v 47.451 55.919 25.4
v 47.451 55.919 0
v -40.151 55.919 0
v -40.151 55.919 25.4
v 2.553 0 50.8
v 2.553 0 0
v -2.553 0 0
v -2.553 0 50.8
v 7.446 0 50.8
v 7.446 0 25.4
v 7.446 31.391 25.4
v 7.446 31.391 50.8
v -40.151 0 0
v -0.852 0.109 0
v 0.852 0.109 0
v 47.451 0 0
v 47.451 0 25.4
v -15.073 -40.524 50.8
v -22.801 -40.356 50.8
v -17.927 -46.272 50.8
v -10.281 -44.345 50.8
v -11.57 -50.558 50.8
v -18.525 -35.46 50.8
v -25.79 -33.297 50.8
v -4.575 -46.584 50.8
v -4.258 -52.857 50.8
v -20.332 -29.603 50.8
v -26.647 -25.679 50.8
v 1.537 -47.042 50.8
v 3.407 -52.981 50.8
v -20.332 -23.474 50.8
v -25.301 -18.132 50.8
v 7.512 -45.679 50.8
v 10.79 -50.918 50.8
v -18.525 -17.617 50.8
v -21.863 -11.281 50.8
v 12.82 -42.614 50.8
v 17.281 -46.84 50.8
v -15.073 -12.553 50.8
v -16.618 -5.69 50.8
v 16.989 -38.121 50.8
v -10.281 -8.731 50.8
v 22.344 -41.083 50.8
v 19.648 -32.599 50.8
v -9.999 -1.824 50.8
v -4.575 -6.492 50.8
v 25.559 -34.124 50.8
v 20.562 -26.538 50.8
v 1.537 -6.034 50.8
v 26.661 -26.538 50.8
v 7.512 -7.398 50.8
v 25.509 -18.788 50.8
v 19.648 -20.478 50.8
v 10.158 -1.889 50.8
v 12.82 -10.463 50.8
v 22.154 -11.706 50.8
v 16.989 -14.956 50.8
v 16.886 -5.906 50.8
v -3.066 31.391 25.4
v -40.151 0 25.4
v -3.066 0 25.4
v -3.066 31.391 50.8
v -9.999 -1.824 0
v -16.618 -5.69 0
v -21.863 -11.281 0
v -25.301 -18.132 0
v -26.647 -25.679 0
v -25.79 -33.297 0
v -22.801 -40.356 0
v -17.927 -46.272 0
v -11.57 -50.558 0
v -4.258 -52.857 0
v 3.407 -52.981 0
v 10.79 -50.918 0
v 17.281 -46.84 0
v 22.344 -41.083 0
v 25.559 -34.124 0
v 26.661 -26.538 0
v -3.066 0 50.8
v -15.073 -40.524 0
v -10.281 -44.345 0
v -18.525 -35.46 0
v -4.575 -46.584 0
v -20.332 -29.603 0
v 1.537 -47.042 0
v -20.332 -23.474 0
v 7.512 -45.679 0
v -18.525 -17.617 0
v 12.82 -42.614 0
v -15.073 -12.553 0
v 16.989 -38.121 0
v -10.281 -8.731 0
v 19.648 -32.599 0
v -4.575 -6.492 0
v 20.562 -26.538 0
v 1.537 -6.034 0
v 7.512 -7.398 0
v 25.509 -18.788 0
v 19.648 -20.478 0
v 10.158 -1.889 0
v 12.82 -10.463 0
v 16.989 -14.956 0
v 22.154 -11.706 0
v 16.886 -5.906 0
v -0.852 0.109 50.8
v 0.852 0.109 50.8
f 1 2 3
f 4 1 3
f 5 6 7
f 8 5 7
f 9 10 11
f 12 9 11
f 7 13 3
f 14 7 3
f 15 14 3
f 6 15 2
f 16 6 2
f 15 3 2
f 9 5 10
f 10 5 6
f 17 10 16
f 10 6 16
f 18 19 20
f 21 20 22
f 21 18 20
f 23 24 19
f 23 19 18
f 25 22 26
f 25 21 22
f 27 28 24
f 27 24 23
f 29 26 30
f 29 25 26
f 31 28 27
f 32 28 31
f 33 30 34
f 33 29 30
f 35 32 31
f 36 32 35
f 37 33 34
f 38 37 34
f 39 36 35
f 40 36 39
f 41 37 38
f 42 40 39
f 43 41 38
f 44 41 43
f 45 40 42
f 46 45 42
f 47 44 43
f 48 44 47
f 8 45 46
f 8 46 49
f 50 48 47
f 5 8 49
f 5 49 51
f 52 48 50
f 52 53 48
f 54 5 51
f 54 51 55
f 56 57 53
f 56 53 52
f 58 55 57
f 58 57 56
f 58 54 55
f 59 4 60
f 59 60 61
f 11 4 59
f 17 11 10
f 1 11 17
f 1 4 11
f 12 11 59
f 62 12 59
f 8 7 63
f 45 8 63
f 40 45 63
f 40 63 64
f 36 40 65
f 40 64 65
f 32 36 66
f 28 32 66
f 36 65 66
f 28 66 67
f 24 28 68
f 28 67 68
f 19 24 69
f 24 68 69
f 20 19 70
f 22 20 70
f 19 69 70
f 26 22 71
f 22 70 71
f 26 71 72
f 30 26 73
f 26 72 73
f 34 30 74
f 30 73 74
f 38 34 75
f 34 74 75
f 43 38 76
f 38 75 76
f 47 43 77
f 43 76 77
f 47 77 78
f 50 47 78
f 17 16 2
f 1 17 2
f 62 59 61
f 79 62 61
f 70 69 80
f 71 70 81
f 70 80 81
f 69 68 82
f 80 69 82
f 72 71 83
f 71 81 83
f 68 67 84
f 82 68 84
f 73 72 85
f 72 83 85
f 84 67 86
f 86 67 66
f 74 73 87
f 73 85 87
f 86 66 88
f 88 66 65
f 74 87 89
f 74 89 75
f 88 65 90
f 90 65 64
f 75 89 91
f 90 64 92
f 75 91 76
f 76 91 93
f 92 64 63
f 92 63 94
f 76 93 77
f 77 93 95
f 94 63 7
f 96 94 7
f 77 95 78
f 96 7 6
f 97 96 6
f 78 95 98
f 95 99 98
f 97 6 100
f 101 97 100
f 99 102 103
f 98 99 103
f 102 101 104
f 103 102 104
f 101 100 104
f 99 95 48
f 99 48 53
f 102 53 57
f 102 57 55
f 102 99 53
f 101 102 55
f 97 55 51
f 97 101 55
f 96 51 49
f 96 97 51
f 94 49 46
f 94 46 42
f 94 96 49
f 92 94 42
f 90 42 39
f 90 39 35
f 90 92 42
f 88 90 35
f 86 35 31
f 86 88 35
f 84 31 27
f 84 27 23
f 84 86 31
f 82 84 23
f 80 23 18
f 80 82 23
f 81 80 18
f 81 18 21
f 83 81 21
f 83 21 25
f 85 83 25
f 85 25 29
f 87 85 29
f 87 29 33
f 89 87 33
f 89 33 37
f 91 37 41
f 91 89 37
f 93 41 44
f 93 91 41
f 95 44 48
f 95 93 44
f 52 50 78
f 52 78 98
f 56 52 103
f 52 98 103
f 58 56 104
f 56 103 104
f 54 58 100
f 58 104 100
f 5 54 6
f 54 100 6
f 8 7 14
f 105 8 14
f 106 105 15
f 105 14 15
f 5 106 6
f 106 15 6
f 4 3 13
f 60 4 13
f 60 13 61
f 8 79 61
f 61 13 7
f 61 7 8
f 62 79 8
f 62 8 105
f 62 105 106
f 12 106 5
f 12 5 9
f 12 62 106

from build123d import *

# Parameters (mm, degrees)
F0_R     = 20.561571
F1_DEPTH = 50.8
F2_DEPTH = 25.4


with BuildPart() as f1:
    # F0 (on Top) → F1 (new body)
    with BuildSketch(Plane.XY):
        with BuildLine():
            Line((2.553322, 0), (-2.553322, 0))
            ThreePointArc((-2.553322, 0), (-17.926626, -46.27249), (26.660862, -26.538314))
            ThreePointArc((26.660862, -26.538314), (19.734175, -8.611689), (2.553322, 0))
        make_face()
        with Locations((0, -26.538314)):
            Circle(F0_R, mode=Mode.SUBTRACT)
        with BuildLine():
            Line((-3.066077, 31.390786), (-3.066077, 0))
            Line((-3.066077, 0), (-2.553322, 0))
            ThreePointArc((-2.553322, 0), (0, 0.122548), (2.553322, 0))
            Line((2.553322, 0), (7.446187, 0))
            Line((7.446187, 0), (7.446187, 31.390786))
            Line((7.446187, 31.390786), (-3.066077, 31.390786))
        make_face()
    extrude(amount=F1_DEPTH)

    # F0 (on Top) → F2 (join)
    with BuildSketch(Plane.XY):
        Polygon((47.451187, 55.919398), (-40.151004, 55.919398), (-40.151004, 0), (-3.066077, 0), (-3.066077, 31.390786), (7.446187, 31.390786), (7.446187, 0), (47.451187, 0), align=None)
    extrude(amount=F2_DEPTH)


solid = f1.part
